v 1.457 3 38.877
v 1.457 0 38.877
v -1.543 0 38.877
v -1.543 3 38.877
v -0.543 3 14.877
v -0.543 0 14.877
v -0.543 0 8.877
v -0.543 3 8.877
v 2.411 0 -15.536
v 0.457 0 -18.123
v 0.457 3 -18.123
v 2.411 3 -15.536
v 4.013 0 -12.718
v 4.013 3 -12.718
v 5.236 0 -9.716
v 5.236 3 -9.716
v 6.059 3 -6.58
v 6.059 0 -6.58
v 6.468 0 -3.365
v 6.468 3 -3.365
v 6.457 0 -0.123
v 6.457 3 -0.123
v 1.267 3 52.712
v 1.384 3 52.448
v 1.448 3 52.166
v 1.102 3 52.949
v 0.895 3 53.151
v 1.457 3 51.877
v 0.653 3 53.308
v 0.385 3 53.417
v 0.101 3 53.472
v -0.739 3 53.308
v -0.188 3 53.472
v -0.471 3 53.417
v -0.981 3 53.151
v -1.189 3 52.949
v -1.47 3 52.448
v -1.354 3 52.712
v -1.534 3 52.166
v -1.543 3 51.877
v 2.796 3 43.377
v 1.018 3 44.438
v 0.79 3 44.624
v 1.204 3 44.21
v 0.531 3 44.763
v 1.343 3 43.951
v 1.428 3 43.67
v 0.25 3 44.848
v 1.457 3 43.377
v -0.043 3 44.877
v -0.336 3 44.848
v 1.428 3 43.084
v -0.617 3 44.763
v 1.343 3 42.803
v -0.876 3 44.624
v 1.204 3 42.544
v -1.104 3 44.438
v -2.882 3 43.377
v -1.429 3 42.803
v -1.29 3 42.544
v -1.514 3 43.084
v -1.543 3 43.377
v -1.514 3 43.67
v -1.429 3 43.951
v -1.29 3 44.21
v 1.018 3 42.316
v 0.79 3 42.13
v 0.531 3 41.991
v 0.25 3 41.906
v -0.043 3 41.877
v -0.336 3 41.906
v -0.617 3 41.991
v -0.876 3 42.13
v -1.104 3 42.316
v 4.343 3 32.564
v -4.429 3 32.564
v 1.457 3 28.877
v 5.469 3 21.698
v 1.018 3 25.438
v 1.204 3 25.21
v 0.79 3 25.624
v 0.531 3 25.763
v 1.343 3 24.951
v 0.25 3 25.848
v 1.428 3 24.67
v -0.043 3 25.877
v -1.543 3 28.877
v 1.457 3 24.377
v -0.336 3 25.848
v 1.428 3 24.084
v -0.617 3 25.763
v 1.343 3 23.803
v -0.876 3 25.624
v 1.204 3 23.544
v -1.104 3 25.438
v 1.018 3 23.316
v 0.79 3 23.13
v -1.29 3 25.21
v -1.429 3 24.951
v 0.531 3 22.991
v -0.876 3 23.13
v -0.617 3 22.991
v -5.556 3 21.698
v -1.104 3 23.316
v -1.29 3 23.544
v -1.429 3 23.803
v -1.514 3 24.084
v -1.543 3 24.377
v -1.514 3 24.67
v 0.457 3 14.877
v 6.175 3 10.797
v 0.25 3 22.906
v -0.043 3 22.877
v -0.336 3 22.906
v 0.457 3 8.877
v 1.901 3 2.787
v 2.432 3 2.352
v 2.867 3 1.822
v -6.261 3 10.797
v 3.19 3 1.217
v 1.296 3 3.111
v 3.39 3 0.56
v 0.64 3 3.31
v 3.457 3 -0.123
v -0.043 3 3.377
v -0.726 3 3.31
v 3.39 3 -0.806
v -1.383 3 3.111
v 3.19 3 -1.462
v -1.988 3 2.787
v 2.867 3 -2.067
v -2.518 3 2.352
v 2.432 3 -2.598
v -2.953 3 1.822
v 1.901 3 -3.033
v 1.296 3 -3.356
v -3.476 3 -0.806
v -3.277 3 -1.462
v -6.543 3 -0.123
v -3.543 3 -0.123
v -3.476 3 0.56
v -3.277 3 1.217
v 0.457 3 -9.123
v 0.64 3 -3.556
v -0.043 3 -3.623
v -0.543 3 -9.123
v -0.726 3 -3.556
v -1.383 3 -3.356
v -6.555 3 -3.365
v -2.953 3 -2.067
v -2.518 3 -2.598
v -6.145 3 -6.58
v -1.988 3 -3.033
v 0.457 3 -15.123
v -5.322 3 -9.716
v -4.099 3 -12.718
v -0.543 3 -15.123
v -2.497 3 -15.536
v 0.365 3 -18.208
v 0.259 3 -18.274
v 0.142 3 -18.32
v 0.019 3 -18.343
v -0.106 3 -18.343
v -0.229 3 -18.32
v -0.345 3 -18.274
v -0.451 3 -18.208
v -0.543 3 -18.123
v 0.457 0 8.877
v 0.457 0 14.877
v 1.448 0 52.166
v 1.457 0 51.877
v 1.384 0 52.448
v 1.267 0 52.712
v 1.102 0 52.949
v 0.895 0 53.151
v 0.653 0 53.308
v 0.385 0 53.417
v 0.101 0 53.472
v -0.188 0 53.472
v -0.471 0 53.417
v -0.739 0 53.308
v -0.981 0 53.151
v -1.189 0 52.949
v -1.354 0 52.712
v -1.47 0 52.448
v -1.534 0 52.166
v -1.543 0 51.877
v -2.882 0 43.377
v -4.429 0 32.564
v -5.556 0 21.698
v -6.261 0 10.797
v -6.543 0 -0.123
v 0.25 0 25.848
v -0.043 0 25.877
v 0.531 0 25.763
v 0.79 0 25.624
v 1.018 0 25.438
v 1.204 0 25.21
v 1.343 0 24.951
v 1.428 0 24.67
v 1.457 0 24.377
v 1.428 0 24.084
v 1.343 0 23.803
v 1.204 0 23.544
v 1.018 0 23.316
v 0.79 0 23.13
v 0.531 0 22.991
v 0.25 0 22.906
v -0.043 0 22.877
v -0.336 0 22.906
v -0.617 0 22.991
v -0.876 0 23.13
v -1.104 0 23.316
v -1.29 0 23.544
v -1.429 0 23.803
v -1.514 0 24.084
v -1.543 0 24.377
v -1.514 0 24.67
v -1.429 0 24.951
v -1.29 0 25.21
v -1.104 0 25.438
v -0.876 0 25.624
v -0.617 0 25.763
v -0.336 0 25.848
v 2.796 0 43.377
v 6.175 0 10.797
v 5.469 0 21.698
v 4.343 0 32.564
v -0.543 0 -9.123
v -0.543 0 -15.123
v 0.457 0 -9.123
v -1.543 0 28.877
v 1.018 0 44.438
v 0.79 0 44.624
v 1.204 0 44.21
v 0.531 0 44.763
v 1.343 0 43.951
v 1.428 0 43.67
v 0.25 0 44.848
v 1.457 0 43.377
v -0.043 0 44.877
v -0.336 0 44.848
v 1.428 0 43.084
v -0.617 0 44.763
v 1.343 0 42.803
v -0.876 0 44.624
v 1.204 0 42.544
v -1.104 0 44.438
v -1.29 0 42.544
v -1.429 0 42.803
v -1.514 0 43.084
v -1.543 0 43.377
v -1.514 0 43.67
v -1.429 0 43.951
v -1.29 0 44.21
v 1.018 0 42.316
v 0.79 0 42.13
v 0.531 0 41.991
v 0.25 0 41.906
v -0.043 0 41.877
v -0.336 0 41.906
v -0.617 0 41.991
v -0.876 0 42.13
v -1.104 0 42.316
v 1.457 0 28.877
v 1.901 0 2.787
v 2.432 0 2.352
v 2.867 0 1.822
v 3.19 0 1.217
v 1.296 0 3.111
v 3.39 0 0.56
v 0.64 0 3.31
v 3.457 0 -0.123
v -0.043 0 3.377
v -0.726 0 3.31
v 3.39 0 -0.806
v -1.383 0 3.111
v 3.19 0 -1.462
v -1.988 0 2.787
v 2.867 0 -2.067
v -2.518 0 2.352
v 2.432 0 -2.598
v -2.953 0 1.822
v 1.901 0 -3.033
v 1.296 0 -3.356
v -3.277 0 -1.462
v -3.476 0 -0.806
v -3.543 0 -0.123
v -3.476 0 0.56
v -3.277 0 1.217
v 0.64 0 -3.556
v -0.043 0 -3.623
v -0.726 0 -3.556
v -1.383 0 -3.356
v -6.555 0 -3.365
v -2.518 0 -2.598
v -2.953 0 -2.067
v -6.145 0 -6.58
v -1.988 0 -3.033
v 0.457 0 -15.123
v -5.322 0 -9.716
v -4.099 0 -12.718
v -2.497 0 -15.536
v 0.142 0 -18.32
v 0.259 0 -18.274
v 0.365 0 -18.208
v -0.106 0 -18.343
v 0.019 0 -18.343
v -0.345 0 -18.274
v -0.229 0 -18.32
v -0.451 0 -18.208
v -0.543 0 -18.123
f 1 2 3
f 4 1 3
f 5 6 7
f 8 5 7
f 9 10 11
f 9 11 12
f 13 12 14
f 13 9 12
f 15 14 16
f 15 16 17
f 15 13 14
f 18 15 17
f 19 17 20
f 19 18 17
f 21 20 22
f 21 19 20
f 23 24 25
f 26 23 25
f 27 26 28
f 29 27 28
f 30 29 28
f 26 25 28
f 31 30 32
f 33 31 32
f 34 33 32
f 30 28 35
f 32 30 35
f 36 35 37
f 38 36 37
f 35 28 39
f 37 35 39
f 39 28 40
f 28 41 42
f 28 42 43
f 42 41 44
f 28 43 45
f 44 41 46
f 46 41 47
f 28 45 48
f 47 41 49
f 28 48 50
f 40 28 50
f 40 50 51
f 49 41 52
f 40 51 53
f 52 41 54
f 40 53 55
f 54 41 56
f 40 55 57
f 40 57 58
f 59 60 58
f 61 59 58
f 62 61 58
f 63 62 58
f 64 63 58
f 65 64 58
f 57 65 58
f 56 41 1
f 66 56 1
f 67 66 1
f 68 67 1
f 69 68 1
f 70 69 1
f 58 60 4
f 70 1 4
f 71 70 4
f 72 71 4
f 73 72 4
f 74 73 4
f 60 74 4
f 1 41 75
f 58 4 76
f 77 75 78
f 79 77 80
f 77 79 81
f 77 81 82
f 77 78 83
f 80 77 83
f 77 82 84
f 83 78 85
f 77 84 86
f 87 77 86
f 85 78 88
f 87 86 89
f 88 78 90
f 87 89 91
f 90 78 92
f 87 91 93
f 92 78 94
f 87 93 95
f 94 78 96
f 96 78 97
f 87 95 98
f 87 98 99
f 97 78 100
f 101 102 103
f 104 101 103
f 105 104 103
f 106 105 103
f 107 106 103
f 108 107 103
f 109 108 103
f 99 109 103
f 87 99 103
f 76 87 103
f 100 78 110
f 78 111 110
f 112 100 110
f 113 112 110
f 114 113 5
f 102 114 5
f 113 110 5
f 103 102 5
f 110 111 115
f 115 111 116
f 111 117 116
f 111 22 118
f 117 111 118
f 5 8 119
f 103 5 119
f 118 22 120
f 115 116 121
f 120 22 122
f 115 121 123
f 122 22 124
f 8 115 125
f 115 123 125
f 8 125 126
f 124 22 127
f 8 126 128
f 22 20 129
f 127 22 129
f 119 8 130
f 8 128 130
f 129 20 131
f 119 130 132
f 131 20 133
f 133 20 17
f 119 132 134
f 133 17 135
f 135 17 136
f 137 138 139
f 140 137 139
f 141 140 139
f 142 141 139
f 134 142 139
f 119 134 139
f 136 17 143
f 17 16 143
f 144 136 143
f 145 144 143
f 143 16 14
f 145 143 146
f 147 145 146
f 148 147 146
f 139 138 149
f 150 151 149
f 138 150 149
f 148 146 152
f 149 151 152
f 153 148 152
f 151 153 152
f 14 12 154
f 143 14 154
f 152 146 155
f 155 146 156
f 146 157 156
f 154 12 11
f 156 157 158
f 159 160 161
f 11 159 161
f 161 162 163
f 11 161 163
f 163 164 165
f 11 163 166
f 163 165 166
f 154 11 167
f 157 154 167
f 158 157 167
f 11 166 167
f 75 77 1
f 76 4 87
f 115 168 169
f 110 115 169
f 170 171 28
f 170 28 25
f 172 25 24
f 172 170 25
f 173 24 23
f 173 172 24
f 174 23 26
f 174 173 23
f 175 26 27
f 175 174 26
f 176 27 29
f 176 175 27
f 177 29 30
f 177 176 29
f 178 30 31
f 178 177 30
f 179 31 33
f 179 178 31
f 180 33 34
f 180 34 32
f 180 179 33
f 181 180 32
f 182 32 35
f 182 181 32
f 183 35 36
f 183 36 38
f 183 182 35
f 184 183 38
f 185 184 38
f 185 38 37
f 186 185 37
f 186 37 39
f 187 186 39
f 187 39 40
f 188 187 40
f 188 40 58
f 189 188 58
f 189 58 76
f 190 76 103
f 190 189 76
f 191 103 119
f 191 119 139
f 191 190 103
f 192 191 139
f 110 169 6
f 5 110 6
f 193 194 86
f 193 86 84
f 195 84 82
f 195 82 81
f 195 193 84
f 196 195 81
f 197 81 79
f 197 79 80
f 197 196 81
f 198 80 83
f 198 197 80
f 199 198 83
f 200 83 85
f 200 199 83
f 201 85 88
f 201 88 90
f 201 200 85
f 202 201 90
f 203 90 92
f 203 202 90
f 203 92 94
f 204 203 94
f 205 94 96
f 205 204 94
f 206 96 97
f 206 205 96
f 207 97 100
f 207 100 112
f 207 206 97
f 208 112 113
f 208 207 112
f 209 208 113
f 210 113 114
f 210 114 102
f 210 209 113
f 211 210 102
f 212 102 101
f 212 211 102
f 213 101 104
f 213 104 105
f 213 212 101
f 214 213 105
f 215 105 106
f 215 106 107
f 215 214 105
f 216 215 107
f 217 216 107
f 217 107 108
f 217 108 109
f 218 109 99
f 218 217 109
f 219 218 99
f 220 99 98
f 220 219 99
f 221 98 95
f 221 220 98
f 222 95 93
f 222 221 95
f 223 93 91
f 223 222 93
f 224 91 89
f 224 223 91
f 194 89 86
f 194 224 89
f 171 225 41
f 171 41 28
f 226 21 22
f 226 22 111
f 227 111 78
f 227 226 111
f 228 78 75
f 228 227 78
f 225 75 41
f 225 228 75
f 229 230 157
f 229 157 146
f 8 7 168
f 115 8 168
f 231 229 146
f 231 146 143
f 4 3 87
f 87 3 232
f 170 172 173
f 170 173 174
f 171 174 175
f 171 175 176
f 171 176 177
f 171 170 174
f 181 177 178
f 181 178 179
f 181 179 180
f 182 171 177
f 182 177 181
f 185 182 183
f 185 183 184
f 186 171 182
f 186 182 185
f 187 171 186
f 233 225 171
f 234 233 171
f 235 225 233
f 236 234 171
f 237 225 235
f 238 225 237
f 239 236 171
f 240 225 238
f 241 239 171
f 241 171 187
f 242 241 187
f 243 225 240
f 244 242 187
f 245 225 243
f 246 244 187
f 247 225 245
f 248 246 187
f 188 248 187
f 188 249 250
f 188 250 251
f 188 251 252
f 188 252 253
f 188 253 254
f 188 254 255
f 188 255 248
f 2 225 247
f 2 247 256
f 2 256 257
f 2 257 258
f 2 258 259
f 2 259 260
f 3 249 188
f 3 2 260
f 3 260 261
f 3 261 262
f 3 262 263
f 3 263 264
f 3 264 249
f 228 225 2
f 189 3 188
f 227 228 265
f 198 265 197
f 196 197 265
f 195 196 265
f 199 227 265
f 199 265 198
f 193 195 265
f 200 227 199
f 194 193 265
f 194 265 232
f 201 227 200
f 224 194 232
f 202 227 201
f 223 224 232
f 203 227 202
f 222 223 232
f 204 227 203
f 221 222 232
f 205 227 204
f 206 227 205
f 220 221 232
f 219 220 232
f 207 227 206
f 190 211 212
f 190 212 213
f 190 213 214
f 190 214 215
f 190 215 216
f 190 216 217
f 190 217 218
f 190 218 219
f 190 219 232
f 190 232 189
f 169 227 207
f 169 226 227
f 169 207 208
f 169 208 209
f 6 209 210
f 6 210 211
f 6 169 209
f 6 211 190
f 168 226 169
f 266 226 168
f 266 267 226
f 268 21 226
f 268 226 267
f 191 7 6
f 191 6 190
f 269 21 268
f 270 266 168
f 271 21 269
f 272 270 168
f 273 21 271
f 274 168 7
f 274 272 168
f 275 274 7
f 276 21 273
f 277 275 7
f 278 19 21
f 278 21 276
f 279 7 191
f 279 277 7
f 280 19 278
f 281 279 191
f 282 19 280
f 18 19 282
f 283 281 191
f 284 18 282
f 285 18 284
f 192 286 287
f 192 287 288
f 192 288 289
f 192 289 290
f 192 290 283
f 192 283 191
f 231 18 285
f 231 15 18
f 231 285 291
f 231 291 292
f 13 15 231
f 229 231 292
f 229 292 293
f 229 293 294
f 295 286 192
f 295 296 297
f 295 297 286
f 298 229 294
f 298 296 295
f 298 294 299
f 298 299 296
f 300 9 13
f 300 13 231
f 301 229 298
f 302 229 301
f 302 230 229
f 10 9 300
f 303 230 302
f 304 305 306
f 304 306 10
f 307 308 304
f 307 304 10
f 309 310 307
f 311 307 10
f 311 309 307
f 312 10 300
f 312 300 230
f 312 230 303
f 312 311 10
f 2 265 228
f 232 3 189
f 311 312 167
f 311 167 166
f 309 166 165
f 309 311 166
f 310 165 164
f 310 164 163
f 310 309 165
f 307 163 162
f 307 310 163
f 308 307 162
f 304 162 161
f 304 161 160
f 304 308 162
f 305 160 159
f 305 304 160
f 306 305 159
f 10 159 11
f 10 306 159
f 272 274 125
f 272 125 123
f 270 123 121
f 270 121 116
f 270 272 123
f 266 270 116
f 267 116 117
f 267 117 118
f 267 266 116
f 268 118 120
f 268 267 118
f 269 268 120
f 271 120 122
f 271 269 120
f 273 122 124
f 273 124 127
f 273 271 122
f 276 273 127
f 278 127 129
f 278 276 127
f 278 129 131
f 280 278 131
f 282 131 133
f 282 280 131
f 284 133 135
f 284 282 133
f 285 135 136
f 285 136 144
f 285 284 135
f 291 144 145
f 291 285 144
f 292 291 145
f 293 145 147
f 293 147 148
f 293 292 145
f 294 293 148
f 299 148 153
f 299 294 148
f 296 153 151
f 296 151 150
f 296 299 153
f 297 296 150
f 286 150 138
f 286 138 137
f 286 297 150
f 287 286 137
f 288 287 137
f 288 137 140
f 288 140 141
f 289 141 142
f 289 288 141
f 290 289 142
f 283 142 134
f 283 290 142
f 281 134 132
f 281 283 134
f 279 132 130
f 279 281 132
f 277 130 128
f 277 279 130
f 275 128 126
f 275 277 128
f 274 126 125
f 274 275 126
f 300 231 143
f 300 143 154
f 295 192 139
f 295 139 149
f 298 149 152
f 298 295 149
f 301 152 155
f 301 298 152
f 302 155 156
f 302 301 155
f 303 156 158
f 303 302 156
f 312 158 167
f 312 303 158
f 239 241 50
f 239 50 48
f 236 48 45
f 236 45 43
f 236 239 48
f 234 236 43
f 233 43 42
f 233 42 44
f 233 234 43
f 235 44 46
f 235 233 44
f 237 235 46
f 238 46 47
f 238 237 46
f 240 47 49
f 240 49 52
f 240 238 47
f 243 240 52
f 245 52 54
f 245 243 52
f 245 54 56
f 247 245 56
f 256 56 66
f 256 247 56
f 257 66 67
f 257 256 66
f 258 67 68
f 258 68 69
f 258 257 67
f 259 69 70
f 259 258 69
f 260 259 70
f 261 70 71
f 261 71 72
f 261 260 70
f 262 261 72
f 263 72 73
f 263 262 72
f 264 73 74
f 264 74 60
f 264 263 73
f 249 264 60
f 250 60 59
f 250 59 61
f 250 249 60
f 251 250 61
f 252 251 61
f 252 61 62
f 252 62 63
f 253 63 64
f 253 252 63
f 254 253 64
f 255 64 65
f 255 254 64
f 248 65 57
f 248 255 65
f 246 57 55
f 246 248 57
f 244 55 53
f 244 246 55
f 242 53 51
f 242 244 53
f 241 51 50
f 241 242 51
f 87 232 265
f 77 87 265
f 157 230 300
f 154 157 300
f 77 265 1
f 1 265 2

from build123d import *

# Parameters (mm, degrees)
ESBO_O1_R                = 3.5
ESBO_O1_R_2              = 1.5
RESSALTO_EXTRUS_O1_DEPTH = 3


with BuildPart() as part:
    # Esboço1 → Ressalto-extrusão1 (new body)
    with BuildSketch(Plane(origin=(0, 0, 0), x_dir=(1, 0, 0), z_dir=(0, 1, 0))):
        with BuildLine():
            Line((-1.543118166, -51.877133975), (-2.882093194, -43.377133975))
            ThreePointArc((-2.882093194, -43.377133975), (-5.555698335, -21.698089912), (-6.543118166, 0.122866025))
            ThreePointArc((-6.543118166, 0.122866025), (-5.322348439, 9.715942783), (-0.543118166, 18.122866025))
            ThreePointArc((-0.543118166, 18.122866025), (-0.043118166, 18.346048676), (0.456881834, 18.122866025))
            ThreePointArc((0.456881834, 18.122866025), (5.236112108, 9.715942783), (6.456881834, 0.122866025))
            ThreePointArc((6.456881834, 0.122866025), (5.469462003, -21.698089912), (2.795856862, -43.377133975))
            Line((2.795856862, -43.377133975), (1.456881834, -51.877133975))
            ThreePointArc((1.456881834, -51.877133975), (-0.043118166, -53.479108362), (-1.543118166, -51.877133975))
        make_face()
        with Locations(Location((-0.043118166, 0.122866025, 0), (0, 0, 270))):
            Circle(ESBO_O1_R, mode=Mode.SUBTRACT)
        with Locations(Location((-0.043118166, -24.377133975, 0), (0, 0, 270))):
            Circle(ESBO_O1_R_2, mode=Mode.SUBTRACT)
        with Locations(Location((-0.043118166, -43.377133975, 0), (0, 0, 270))):
            Circle(ESBO_O1_R_2, mode=Mode.SUBTRACT)
        Polygon((-0.043118166, -14.877133975), (-0.543118166, -14.877133975), (-0.543118166, -8.877133975), (0.456881834, -8.877133975), (0.456881834, -14.877133975), align=None, mode=Mode.SUBTRACT)
        Polygon((0.456881834, 15.122866025), (-0.043118166, 15.122866025), (-0.543118166, 15.122866025), (-0.543118166, 9.122866025), (0.456881834, 9.122866025), align=None, mode=Mode.SUBTRACT)
        Polygon((-0.043118166, -28.877133975), (1.456881834, -28.877133975), (1.456881834, -38.877133975), (-0.043118166, -38.877133975), (-1.543118166, -38.877133975), (-1.543118166, -28.877133975), align=None, mode=Mode.SUBTRACT)
    extrude(amount=RESSALTO_EXTRUS_O1_DEPTH)


solid = part.part
